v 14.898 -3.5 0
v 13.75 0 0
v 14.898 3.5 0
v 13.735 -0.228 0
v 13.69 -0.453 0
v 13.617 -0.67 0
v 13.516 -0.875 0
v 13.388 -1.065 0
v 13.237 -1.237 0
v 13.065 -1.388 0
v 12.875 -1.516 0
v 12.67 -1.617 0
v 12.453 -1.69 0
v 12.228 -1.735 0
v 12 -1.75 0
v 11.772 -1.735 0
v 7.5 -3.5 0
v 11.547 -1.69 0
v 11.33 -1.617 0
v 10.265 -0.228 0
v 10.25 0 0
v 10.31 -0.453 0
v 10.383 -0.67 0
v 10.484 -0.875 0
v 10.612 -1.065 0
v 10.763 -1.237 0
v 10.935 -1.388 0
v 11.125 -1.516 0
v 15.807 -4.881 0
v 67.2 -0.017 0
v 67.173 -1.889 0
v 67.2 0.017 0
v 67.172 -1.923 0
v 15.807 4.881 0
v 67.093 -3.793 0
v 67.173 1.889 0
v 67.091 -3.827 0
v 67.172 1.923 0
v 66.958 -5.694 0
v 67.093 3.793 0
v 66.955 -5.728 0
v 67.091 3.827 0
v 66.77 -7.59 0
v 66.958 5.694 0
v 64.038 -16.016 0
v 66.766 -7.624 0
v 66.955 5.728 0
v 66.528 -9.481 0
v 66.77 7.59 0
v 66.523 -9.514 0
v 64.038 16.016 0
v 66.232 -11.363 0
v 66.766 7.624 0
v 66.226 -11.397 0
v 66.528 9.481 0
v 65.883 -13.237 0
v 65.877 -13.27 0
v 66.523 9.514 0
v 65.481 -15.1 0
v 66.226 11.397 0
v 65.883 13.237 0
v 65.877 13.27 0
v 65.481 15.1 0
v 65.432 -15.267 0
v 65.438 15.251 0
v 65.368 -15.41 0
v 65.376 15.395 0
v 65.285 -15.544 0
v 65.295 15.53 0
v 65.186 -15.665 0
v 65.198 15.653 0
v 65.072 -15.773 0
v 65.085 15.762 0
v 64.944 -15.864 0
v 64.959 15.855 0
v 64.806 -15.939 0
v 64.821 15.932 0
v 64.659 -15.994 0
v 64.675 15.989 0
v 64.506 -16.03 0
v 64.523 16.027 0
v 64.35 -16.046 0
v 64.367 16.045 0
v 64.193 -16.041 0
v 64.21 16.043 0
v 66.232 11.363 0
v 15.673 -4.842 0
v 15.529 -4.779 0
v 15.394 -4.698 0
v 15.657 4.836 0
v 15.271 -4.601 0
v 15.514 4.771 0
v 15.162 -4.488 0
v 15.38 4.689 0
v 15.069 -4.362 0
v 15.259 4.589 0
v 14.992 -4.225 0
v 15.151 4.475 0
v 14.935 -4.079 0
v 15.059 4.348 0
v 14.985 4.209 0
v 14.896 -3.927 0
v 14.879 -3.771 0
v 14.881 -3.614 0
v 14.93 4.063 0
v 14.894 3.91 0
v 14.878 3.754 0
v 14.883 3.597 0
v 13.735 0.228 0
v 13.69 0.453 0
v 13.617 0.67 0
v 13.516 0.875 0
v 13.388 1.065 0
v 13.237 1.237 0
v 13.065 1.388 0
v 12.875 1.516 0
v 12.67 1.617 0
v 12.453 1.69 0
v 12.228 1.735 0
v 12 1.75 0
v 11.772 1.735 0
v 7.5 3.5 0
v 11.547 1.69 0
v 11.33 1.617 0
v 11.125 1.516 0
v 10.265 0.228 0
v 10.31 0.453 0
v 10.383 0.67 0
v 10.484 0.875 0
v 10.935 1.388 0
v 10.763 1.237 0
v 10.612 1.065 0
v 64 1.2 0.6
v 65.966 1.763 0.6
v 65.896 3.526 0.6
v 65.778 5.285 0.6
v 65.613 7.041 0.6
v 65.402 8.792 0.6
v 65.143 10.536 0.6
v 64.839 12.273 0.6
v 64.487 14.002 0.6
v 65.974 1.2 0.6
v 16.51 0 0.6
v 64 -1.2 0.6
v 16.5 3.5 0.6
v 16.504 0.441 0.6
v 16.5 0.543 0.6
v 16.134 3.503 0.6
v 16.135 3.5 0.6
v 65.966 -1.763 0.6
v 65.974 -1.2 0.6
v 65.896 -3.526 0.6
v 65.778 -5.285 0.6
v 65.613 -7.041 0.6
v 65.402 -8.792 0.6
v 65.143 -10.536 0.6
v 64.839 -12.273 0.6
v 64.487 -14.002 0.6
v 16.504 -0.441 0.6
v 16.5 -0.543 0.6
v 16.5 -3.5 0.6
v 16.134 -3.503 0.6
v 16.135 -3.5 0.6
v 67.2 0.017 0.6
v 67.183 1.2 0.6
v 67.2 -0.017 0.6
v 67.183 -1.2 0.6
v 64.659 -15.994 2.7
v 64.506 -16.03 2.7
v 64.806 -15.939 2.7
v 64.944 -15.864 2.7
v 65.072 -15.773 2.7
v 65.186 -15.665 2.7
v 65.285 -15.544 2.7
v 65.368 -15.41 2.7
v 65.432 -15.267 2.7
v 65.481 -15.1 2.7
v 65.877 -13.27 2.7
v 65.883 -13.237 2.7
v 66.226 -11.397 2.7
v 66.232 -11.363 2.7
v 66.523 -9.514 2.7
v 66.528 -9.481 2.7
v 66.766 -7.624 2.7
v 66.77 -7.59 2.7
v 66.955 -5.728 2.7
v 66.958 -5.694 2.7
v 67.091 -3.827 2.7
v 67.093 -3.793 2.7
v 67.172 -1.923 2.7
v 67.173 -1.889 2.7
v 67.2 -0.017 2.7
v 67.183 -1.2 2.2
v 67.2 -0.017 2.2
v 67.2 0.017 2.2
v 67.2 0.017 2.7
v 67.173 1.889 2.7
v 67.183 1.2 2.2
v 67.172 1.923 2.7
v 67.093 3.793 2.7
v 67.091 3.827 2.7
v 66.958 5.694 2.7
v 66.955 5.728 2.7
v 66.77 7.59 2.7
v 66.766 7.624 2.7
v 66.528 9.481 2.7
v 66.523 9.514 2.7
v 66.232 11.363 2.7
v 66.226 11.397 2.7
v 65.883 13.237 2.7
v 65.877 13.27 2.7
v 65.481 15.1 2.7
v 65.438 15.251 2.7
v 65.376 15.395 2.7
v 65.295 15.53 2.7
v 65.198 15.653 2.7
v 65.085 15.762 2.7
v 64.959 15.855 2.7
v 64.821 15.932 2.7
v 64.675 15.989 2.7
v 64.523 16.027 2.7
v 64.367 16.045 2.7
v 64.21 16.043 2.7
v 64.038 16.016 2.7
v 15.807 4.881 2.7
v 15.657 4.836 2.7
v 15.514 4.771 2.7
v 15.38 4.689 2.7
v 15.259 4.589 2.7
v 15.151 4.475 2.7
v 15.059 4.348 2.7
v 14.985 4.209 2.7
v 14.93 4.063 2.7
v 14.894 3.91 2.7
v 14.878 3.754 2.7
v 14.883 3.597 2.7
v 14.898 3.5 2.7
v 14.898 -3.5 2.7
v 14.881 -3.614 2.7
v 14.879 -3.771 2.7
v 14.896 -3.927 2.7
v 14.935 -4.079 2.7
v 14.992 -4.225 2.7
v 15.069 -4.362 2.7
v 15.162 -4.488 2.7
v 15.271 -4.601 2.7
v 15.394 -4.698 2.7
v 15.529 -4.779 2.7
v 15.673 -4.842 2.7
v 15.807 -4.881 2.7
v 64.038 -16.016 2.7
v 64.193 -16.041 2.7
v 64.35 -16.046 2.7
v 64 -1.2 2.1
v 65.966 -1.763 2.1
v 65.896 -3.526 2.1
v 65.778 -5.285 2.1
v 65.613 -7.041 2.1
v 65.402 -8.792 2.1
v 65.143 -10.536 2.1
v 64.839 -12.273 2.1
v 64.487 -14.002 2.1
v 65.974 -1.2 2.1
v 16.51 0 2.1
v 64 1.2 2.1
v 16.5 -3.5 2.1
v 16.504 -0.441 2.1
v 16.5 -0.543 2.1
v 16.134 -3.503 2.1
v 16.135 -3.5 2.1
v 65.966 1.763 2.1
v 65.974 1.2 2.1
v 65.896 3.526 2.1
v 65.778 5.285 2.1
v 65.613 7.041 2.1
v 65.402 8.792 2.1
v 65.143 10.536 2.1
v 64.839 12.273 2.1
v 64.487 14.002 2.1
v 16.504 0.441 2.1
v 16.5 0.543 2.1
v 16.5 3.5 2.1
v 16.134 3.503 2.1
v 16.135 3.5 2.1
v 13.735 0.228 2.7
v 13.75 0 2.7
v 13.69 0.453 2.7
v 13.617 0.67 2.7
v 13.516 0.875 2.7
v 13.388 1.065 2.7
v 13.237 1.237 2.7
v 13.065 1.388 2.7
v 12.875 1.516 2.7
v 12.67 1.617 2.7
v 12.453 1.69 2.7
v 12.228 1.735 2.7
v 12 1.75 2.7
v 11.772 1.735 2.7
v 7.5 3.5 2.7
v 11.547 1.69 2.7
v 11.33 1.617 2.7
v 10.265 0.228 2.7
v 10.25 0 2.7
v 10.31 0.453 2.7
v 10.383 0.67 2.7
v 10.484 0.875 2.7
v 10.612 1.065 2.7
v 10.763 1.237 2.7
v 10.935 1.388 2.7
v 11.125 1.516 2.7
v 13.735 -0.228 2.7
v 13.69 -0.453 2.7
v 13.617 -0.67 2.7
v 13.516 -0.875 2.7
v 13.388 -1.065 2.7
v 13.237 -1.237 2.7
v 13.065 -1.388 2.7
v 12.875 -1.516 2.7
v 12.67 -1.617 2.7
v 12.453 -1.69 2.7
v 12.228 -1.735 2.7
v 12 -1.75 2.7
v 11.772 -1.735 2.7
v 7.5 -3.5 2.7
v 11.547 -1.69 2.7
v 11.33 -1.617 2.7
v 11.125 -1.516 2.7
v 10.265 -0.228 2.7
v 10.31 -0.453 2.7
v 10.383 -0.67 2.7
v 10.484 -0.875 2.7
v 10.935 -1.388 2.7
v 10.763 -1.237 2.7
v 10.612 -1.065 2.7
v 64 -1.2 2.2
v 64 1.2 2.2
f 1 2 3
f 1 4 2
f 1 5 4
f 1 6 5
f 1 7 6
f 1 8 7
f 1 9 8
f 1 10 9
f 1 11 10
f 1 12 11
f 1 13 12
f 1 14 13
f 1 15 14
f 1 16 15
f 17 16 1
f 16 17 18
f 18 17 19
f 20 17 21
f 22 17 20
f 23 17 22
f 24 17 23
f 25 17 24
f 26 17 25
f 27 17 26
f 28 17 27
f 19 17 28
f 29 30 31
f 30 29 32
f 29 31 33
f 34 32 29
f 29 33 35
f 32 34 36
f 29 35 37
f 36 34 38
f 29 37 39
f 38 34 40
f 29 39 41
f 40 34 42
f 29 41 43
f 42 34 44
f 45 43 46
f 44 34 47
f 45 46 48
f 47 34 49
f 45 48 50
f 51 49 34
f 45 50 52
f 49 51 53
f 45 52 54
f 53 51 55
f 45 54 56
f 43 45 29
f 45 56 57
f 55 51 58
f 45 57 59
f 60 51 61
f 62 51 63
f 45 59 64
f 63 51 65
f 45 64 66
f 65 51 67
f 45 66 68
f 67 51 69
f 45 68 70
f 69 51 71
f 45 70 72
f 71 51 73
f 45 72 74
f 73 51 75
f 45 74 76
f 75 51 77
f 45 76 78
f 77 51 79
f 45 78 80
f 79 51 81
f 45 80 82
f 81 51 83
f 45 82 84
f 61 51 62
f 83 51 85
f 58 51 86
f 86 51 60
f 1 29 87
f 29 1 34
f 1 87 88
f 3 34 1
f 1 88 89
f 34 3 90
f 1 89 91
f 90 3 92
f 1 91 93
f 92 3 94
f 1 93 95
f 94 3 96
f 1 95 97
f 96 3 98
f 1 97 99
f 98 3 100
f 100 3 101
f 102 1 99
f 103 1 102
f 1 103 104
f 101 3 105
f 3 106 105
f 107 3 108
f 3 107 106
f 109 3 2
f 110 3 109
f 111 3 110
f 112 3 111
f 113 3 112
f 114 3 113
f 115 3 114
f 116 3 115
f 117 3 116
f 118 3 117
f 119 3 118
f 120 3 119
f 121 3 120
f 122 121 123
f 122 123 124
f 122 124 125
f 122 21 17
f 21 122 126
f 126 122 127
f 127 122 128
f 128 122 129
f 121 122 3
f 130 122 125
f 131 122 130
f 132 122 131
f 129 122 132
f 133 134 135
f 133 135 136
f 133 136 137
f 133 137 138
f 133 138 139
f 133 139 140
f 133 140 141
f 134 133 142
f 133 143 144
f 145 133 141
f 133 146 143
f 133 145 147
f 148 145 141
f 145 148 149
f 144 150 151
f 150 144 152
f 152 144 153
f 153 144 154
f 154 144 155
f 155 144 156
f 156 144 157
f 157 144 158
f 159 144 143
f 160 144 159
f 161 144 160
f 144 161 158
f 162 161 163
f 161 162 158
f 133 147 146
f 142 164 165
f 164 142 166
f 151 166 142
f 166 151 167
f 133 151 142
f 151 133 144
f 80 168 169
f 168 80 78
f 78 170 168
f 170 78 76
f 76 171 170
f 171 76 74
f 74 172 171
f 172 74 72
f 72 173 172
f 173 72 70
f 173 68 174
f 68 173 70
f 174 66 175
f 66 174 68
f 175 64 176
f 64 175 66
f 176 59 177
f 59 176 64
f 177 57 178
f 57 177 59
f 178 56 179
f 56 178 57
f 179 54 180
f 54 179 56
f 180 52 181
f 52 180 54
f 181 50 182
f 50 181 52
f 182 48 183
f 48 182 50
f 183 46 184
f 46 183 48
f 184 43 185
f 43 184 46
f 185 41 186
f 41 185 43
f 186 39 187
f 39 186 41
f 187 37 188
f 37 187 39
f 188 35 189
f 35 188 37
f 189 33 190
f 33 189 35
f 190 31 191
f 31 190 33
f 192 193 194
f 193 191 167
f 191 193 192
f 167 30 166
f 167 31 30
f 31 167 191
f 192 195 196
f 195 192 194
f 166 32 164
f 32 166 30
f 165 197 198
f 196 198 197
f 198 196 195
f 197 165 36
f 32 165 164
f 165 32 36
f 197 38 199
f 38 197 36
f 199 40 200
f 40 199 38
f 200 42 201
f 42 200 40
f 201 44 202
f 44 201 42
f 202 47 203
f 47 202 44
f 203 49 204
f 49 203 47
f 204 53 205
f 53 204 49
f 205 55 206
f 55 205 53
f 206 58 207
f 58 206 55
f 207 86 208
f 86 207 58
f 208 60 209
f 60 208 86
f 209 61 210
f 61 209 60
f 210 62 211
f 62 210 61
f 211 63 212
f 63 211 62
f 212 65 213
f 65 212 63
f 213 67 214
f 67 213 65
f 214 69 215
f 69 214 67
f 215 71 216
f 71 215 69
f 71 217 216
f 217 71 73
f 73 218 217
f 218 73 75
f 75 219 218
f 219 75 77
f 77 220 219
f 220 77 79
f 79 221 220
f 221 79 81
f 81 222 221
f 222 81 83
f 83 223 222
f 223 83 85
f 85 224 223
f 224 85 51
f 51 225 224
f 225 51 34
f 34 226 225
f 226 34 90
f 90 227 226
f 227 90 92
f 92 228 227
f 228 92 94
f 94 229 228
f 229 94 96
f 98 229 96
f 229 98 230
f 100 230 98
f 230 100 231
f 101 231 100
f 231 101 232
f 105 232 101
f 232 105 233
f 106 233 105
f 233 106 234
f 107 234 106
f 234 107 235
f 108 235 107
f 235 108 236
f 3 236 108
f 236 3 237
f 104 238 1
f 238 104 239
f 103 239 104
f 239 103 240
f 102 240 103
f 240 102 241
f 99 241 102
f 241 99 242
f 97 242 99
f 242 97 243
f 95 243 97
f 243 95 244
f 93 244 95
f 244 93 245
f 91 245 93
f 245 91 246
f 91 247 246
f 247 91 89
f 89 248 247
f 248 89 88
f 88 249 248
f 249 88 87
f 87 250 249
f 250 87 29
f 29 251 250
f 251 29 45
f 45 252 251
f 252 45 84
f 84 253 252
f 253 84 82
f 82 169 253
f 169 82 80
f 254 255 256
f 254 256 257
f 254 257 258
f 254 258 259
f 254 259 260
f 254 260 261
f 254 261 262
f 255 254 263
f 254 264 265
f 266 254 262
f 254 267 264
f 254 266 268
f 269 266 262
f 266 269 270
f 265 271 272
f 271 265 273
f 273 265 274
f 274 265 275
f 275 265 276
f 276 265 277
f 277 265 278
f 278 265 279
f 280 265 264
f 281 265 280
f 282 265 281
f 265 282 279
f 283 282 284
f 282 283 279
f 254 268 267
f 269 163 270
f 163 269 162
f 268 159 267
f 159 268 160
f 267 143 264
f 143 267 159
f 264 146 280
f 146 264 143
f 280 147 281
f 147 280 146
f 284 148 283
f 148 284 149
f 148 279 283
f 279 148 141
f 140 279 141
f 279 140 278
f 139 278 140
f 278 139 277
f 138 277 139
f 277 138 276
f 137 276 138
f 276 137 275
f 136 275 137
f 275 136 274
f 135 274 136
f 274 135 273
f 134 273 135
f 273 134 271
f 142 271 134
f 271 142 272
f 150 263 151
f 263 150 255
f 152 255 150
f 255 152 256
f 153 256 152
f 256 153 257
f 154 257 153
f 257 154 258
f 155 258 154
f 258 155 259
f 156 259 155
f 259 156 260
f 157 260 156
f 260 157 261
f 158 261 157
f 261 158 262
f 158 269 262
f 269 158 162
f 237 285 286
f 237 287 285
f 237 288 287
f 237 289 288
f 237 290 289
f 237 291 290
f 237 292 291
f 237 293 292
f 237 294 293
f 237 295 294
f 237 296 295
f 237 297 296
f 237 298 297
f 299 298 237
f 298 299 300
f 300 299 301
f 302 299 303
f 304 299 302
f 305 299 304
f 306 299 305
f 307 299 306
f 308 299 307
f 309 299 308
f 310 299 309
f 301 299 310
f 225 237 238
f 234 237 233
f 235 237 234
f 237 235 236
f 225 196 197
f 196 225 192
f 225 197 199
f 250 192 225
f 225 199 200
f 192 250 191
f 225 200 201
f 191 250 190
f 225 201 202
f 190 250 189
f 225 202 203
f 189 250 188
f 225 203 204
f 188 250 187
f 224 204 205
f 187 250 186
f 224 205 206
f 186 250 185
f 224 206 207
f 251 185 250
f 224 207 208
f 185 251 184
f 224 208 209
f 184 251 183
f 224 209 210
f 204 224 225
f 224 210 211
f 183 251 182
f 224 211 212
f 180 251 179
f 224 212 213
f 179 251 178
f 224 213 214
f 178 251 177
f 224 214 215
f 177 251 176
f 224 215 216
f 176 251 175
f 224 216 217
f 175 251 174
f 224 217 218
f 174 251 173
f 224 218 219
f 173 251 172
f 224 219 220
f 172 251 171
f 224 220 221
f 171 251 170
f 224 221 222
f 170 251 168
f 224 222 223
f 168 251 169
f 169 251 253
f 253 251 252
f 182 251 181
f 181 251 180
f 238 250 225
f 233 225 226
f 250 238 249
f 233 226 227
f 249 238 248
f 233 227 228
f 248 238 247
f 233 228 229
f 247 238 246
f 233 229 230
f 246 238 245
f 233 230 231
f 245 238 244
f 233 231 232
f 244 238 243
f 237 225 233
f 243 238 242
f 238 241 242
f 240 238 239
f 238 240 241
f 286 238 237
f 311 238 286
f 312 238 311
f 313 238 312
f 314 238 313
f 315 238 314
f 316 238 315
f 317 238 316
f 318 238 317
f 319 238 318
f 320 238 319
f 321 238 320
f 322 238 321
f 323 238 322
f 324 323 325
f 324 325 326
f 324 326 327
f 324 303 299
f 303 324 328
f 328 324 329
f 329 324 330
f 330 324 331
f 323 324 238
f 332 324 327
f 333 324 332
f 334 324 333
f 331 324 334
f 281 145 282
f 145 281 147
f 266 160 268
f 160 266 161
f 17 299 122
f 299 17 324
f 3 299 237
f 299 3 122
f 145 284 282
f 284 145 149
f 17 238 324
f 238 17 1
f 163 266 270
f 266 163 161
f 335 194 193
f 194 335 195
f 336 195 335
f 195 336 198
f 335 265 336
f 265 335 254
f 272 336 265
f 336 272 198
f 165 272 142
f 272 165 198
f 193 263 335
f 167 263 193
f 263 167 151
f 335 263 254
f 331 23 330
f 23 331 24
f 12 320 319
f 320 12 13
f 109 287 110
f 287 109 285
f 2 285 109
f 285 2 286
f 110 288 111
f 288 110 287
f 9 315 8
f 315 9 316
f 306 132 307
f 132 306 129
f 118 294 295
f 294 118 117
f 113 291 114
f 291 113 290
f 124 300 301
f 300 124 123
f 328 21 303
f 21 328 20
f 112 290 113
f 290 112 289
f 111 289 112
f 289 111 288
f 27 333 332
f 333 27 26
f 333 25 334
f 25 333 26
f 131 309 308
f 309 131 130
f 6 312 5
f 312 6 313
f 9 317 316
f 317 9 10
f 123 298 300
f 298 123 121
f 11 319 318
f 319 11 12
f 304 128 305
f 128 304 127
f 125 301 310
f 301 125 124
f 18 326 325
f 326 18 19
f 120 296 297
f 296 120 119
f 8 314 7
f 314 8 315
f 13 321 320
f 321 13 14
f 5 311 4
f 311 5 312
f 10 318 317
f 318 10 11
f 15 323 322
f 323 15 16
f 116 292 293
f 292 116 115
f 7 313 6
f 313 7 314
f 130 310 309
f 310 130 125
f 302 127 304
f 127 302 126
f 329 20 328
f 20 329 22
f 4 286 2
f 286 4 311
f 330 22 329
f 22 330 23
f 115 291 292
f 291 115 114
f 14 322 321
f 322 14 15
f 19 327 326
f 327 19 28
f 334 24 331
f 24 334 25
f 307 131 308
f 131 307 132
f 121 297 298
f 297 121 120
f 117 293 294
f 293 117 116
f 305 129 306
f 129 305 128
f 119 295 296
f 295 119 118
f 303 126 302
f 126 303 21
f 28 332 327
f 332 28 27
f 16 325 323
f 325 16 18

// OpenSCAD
// file: parameters.scad
// =============================================================================
// Gen-AH Dual-rotor copper-centroid hypermicro AFPM — WOUND-AWARE (HARD GATE)
// PRIMARY challenger vs Gen-AE. Magnets @ R=41 over copper centroid + 180 t + m2m 4.96.
// =============================================================================

// --- Wire / wind budget (26 AWG, ~1 lb spool ≈ 390 m bare-equiv) --------------
wire_awg            = 26;
wire_od             = 0.45;     // insulated OD mm
turns               = 180;      // +10 vs Gen-AE 170
fill                = 0.70;
layers_per_face     = 2;        // axial layers proud of EACH flange
wind_build_axial    = layers_per_face * wire_od * fill;   // 0.63 mm
wind_build_radial   = 3 * wire_od * fill;                 // 0.945 mm

// --- Pancake former (bare STL) -----------------------------------------------
coil_id_r           = 16.5;     // copper-centroid window vs AE 18.5–64
coil_od_r           = 66.0;
span_deg            = 26.0;     // 12 stations × 30° pitch
former_web          = 1.50;
flange_t            = 0.60;
wall                = 1.2;
slot_w              = 2.4;
mount_hole          = 3.5;
tab_len             = 7.0;

former_bare_h       = former_web + 2 * flange_t;            // 2.70 mm
coil_envelope_h     = former_bare_h + 2 * wind_build_axial; // 3.96 mm

// --- Running clearance (magnet face → WOUND face) EACH side ------------------
run_clear           = 0.50;     // PASS floor ≥ 0.5
gap_spacer_h        = run_clear + wind_build_axial;         // 1.13 mm
m2m                 = coil_envelope_h + 2 * run_clear;      // 4.96 mm (beats Gen-AE 5.00)

// --- Mid stator (12 pancakes 3φ; winds proud both faces) ---------------------
coil_stations       = 12;
bay_r_in            = coil_id_r - 2.0 - wind_build_radial;
bay_r_out           = coil_od_r + 2.0 + wind_build_radial;
bay_span            = span_deg + 4.0;
bay_offset          = 2.0;
stator_thick        = former_bare_h;                        // winds proud ±Z
stator_od           = 160.0;
shaft_clear_stator  = 34.0;
coil_mount_r        = 26.0;

// --- Rotors (×2) — 8×Ø20 @ R=41 (copper centroid) + 24×Ø5 Halbach ------------
large_pocket_d      = 20.3;
small_pocket_d      = 5.3;
pocket_h            = 5.2;
large_n             = 8;
R_large             = 41.0;     // covers ~31–51 over copper centroid ~41
R_small_inner       = 26.0;
R_small_mid         = 41.0;
R_small_outer       = 58.0;
carrier_od          = 156.0;
carrier_thick       = 7.5;
hub_h               = 10.0;
hub_od              = 30.0;
rotor_b_offset_deg  = 22.5;

// --- Modular MAX interface (Gen-E family) ------------------------------------
shaft_bore          = 8.35;
bearing_d           = 21.85;
bearing_h           = 7.2;
m3_clear            = 3.5;
bolt_r_inner        = 36.0;
bolt_n_inner        = 6;
flange_bolt_r       = 72.0;
flange_bolt_n       = 6;
brace_r             = 68.0;
brace_d             = 4.3;
brace_n             = 4;

spacer_pad_od       = 14.0;
spacer_pad_id       = m3_clear;
endbell_od          = 160.0;
endbell_thick       = 8.0;
endbell_shaft_clear = 10.0;

$fn = 64;
// main file
// Gen-AH pancake former — wind BEFORE assembly
include <parameters.scad>;
$fn = 48;

module sector_2d(r_in, r_out, ang) {
    polygon([
        for (a = [-ang/2 : ang/16 : ang/2]) [r_in*cos(a), r_in*sin(a)],
        for (a = [ang/2 : -ang/16 : -ang/2]) [r_out*cos(a), r_out*sin(a)]
    ]);
}
module flange() {
    linear_extrude(flange_t) offset(r=wall) sector_2d(coil_id_r, coil_od_r, span_deg);
}
difference() {
    union() {
        flange();
        translate([0, 0, flange_t])
            linear_extrude(former_web)
                difference() {
                    offset(r=wall) sector_2d(coil_id_r, coil_od_r, span_deg);
                    sector_2d(coil_id_r + 0.01, coil_od_r - 0.01, span_deg - 1.5);
                }
        translate([0, 0, flange_t + former_web]) flange();
        translate([coil_id_r - tab_len - 2, -3.5, 0])
            cube([tab_len + 2, 7, former_bare_h]);
    }
    translate([coil_od_r - 2, -slot_w/2, flange_t])
        cube([wall + 4, slot_w, former_web + 0.1]);
    translate([coil_id_r - tab_len/2 - 1, 0, -0.1])
        cylinder(d=mount_hole, h=former_bare_h + 1);
}
